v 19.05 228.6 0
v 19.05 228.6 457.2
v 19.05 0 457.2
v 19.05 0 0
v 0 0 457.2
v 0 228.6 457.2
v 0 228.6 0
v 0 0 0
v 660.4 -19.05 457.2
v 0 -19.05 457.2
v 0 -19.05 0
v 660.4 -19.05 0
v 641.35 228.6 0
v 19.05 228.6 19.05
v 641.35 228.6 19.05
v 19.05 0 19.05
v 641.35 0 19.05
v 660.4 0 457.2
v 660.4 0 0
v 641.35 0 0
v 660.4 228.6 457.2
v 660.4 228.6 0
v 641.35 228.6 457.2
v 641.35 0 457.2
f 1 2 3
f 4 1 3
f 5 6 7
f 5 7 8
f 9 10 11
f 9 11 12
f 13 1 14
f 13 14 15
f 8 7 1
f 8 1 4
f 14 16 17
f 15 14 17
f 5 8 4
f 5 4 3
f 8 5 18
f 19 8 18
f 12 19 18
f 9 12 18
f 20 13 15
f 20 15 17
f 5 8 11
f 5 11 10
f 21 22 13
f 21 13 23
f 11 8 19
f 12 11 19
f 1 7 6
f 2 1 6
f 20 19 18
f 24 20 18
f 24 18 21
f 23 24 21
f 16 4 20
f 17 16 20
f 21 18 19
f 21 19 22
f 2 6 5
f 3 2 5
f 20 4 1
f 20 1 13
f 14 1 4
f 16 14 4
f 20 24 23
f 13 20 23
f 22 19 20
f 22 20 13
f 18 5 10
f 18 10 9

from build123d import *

# Parameters (mm, degrees)
F0_W     = 660.4
F0_H     = 457.2
F1_DEPTH = 19.05
F2_W     = 228.6
F2_H     = 457.2
F3_DEPTH = 19.05
F4_W     = 228.6
F4_H     = 457.2
F5_DEPTH = 19.05
F6_W     = 622.3
F6_H     = 228.6
F7_DEPTH = 19.05


with BuildPart() as f1:
    # F0 (on Front) → F1 (new body)
    with BuildSketch(Plane.XZ):
        with Locations((330.2, 228.6)):
            Rectangle(F0_W, F0_H)
    extrude(amount=F1_DEPTH)


with BuildPart() as f3:
    # F2 (on face) → F3 (new body)
    with BuildSketch(Plane.YZ.offset(660.4)):
        with Locations((114.3, 228.6)):
            Rectangle(F2_W, F2_H)
    extrude(amount=-F3_DEPTH)


with BuildPart() as f5:
    # F4 (on face) → F5 (new body)
    with BuildSketch(Plane(origin=(0, 0, 0), x_dir=(0, -1, 0), z_dir=(-1, 0, 0))):
        with Locations((-114.3, 228.6)):
            Rectangle(F4_W, F4_H)
    extrude(amount=-F5_DEPTH)


with BuildPart() as f7:
    # F6 (on face) → F7 (new body)
    with BuildSketch(Plane(origin=(0, 0, 0), x_dir=(1, 0, 0), z_dir=(0, 0, -1))):
        with Locations((330.2, -114.3)):
            Rectangle(F6_W, F6_H)
    extrude(amount=-F7_DEPTH)


solid = Compound([f1.part, f3.part, f5.part, f7.part])
